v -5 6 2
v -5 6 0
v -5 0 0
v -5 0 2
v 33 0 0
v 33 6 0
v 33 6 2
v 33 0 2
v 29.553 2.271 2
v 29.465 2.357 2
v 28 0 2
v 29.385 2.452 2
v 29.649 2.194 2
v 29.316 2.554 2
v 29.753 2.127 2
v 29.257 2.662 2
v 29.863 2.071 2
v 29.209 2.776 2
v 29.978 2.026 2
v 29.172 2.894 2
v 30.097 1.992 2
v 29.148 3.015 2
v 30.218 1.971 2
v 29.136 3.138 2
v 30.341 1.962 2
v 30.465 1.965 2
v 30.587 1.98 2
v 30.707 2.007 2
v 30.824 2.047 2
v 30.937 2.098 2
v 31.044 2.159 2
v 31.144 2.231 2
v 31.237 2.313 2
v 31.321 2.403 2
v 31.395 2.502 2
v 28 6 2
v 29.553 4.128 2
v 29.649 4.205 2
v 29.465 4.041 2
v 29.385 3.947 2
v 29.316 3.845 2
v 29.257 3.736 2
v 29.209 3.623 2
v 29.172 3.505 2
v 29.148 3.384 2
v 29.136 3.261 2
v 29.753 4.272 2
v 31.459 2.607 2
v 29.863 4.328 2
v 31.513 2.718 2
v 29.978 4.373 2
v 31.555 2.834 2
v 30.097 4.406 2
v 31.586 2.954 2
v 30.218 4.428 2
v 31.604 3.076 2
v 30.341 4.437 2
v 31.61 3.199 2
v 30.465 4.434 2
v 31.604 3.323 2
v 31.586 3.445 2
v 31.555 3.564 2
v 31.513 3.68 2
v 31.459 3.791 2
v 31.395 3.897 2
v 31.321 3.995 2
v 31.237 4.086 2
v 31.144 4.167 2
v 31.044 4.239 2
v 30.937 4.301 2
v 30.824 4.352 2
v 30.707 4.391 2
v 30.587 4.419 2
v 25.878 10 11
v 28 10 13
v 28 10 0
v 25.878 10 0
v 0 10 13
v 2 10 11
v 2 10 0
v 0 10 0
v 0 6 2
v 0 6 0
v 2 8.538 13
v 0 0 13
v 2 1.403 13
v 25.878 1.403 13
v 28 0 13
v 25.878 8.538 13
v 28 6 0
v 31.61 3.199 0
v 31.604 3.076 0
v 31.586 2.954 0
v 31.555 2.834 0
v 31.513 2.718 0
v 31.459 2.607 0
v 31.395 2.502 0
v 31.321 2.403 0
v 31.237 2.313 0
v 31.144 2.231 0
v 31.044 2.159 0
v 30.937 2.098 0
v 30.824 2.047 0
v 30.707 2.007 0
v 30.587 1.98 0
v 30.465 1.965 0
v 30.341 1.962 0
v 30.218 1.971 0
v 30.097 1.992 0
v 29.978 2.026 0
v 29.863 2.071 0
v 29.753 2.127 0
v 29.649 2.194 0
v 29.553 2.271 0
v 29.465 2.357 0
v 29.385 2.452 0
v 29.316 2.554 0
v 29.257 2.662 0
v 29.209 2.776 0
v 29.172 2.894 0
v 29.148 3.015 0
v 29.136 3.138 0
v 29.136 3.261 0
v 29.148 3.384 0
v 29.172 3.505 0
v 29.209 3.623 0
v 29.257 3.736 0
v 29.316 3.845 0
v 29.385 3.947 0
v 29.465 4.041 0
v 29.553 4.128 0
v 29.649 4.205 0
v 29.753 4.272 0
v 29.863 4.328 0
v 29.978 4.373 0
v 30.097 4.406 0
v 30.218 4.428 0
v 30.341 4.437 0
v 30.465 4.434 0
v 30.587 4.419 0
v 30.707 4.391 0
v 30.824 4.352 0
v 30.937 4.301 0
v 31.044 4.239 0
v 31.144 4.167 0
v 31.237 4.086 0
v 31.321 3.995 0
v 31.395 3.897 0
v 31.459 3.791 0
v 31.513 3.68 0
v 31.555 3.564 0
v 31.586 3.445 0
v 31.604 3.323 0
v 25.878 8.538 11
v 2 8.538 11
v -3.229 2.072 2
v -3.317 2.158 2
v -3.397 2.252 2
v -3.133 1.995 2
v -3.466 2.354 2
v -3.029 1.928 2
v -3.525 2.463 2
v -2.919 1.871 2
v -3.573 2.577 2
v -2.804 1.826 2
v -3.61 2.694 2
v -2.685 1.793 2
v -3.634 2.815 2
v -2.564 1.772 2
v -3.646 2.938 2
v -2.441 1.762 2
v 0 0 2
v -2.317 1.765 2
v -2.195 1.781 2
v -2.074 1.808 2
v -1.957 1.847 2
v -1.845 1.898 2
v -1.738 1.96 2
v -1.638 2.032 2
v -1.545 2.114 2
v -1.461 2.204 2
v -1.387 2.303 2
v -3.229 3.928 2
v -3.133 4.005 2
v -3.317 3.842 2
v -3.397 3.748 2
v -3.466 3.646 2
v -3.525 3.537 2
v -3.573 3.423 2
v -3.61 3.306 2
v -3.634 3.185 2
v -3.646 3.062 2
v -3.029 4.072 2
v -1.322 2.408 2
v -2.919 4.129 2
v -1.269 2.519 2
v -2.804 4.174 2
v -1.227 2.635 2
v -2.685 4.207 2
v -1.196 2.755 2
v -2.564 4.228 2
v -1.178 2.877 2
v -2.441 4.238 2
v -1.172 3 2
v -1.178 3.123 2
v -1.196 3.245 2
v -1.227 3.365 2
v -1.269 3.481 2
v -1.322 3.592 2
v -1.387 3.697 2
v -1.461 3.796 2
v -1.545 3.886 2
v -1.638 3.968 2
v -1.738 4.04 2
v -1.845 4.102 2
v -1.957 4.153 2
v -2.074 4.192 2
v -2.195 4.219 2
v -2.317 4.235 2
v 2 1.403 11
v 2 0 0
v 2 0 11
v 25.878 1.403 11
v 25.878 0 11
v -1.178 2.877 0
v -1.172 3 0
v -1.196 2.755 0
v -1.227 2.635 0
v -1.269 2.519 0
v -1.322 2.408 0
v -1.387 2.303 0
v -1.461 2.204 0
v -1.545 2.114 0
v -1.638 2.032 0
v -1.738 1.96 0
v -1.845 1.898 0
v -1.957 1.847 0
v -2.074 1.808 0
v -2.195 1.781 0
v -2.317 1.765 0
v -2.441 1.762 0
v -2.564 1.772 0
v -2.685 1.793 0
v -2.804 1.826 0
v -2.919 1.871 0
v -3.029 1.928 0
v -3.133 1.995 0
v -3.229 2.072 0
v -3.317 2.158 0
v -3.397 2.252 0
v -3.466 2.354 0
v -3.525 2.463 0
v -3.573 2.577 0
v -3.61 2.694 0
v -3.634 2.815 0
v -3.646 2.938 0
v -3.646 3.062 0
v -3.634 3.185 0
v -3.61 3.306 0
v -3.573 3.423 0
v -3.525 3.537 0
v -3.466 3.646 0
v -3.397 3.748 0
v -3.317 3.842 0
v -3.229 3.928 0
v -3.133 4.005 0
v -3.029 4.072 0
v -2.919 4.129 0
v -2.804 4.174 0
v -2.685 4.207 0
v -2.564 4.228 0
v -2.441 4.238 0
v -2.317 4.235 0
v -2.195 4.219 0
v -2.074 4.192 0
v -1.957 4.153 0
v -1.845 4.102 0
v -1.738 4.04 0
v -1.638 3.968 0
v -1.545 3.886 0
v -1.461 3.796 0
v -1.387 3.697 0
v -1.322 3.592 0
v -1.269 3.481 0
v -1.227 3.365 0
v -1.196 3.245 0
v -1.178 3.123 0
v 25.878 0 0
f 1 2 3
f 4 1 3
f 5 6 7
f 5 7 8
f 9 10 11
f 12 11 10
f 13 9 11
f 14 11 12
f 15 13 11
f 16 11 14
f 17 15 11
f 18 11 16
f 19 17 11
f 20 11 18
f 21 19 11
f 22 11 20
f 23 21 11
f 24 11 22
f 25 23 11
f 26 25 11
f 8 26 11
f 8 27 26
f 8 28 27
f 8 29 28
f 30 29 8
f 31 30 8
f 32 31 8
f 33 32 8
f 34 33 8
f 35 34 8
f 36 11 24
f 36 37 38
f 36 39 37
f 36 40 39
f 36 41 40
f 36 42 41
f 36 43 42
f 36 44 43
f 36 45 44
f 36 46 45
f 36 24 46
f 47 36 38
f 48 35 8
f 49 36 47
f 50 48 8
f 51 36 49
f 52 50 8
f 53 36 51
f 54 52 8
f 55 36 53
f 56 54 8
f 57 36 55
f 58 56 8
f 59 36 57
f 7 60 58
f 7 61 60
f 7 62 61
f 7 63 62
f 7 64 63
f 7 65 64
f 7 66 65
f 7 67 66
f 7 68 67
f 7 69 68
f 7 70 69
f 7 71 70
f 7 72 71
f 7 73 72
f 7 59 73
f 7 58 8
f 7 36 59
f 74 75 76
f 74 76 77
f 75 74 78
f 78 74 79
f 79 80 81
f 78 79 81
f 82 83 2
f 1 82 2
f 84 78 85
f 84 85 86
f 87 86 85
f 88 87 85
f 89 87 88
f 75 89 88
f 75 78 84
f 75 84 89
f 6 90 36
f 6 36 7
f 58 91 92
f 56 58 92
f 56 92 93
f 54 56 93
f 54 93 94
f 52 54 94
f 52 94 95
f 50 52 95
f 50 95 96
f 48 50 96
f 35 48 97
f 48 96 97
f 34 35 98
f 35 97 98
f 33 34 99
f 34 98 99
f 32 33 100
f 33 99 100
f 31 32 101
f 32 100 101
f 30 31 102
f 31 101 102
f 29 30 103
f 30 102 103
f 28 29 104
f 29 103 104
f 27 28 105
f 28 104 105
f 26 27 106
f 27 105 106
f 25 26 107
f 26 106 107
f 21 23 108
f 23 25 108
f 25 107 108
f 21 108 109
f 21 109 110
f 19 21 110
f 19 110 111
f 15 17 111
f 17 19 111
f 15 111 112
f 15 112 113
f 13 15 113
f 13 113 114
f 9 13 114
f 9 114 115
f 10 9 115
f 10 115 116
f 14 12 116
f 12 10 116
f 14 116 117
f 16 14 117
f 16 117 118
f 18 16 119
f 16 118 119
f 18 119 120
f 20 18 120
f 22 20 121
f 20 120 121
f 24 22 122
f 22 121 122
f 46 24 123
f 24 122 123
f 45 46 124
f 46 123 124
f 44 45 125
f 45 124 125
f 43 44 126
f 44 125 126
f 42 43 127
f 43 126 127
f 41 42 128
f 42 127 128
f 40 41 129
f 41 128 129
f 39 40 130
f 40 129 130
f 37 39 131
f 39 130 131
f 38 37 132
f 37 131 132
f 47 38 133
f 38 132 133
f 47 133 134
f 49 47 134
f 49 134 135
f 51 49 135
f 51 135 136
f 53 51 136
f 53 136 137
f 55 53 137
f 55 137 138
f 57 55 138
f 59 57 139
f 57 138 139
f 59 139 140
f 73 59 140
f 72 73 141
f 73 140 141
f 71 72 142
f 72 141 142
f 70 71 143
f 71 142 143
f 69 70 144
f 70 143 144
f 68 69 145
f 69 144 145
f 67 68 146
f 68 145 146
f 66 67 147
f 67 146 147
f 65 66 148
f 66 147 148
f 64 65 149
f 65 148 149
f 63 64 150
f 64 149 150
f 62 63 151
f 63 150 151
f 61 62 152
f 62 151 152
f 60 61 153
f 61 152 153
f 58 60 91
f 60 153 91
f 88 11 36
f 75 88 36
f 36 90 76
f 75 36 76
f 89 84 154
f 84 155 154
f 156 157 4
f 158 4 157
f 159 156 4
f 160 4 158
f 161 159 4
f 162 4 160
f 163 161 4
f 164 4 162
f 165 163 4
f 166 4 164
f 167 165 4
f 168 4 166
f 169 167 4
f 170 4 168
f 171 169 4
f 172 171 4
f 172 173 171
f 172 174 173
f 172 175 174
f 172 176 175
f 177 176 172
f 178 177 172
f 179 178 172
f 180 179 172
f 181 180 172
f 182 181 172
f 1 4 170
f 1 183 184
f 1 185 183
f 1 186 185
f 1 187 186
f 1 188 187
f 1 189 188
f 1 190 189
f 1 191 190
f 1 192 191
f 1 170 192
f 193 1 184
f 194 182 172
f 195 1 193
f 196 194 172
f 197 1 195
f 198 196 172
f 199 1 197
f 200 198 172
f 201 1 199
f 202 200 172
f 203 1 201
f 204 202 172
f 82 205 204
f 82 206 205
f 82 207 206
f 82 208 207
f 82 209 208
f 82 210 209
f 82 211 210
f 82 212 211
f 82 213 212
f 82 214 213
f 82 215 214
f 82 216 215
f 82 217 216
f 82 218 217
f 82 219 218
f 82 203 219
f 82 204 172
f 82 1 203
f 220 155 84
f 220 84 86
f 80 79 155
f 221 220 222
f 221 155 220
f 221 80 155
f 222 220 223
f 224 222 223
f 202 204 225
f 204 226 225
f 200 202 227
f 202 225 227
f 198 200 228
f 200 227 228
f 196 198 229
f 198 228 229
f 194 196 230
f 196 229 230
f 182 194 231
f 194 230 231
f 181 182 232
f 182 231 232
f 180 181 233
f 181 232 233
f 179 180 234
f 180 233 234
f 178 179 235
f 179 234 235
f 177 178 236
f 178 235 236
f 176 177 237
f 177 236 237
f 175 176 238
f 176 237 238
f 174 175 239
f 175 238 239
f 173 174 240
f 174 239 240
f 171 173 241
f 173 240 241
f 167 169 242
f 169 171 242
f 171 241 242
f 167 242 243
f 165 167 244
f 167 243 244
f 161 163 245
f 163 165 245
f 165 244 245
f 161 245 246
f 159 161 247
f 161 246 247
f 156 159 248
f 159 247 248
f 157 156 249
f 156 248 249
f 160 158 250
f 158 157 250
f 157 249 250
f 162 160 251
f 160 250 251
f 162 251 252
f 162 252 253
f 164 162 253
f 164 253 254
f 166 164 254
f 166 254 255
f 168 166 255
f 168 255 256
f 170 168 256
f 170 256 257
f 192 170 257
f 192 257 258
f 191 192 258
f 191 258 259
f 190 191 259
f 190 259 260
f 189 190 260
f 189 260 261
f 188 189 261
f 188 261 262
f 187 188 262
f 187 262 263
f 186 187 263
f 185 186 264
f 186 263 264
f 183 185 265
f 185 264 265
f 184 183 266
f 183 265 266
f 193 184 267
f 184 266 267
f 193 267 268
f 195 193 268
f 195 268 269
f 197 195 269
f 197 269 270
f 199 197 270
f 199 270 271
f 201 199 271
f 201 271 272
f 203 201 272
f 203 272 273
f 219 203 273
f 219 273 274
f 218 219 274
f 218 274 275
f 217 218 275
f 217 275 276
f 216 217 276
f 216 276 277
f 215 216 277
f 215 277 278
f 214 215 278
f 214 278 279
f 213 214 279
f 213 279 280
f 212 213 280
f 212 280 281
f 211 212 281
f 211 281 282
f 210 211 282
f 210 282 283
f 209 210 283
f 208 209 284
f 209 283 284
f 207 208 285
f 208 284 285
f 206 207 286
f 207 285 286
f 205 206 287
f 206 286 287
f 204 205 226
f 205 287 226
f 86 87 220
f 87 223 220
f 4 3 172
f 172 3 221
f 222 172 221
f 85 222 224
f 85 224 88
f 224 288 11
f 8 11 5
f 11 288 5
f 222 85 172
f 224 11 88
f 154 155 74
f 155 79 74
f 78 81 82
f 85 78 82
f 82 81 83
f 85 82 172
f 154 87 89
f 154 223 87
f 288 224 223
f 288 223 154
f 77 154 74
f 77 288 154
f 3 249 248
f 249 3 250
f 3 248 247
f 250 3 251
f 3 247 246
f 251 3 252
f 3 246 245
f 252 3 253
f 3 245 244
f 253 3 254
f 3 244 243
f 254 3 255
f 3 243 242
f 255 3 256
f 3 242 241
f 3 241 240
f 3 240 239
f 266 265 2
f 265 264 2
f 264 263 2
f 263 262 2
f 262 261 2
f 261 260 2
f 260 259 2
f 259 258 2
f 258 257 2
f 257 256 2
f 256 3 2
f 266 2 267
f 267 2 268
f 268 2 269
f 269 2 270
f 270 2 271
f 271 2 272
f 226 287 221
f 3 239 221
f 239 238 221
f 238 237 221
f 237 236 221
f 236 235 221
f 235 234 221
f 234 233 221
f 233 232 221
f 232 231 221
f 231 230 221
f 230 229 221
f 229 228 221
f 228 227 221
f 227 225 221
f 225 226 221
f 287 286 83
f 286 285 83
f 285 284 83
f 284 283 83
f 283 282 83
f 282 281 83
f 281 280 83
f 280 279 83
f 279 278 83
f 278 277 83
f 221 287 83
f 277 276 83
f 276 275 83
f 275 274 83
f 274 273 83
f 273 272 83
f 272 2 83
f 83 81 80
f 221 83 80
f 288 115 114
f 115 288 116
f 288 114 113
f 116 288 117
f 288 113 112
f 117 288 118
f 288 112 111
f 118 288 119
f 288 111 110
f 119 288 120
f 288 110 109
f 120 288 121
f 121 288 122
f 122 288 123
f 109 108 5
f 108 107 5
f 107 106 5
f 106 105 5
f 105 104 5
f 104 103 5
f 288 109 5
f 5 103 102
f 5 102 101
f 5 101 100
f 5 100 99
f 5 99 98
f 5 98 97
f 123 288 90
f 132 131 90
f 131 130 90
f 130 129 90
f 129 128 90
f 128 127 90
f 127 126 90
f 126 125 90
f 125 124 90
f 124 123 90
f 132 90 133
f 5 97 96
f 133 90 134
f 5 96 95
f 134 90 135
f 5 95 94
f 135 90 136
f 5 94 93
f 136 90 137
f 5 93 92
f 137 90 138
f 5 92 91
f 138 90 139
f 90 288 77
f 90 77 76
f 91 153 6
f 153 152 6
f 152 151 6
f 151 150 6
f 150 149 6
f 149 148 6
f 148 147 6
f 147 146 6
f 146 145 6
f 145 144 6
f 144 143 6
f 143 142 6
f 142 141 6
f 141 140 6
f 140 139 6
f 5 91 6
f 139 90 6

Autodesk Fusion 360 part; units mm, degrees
sketch "Sketch1" plane through (0, 0, 0) normal (0, 0, 1) x (1, 0, 0)
  line L0 (0, 0) -> (28, 0)
  line L1 (28, 0) -> (28, 10)
  line L2 (28, 10) -> (0, 10)
  line L3 (0, 10) -> (0, 0)
  line L4 (2, 0) -> (25.8784, 0)
  line L5 (25.8784, 0) -> (25.8784, 10)
  line L6 (25.8784, 10) -> (2, 10)
  line L7 (2, 10) -> (2, 0)
  line L8 (-5, 0) -> (0, 0)
  line L9 (0, 0) -> (0, 6)
  line L10 (0, 6) -> (-5, 6)
  line L11 (-5, 6) -> (-5, 0)
  line L12 (28, 6) -> (33, 6)
  line L13 (33, 6) -> (33, 0)
  line L14 (33, 0) -> (28, 0)
  line L15 (28, 0) -> (28, 6)
  circle A0 centre (-2.4098, 3) radius 1.2381
  line L16 (13.9392, 10) -> (14, 0) construction
  line L17 (2, 8.5375) -> (25.8784, 8.5375)
  line L18 (25.8784, 8.5375) -> (25.8784, 1.4031)
  line L19 (25.8784, 1.4031) -> (2, 1.4031)
  line L20 (2, 1.4031) -> (2, 8.5375)
  circle A1 centre (30.3721, 3.1993) radius 1.2381
  dimension "d1" = 28
  dimension "d2" = 10
  dimension "d11" = 6
  dimension "d12" = 3
  dimension "d14" = 6
extrude "Extrude1" add sketch "Sketch1" along normal blind 2 contours L3 L8 L9 L10 L11 | L1 L12 L13 L14 L15 makes body 1 at (-2.5008, 0.5884, 0) makes body 2 at (30.4882, 0.6549, 0)
extrude "Extrude2" add sketch "Sketch1" along normal blind 13 contours L0 L2 L3 L7 L9 L20 | L0 L4 L5 L7 L19 | L0 L1 L2 L5 L15 L18 | L2 L5 L6 L7 L17 bodies 1 2
extrude "Extrude3" cut sketch "Sketch1" along normal blind 11 contours L0 L4 L5 L7 L19 | L5 L7 L17 L18 L19 L20 | L2 L5 L6 L7 L17 bodies 1
